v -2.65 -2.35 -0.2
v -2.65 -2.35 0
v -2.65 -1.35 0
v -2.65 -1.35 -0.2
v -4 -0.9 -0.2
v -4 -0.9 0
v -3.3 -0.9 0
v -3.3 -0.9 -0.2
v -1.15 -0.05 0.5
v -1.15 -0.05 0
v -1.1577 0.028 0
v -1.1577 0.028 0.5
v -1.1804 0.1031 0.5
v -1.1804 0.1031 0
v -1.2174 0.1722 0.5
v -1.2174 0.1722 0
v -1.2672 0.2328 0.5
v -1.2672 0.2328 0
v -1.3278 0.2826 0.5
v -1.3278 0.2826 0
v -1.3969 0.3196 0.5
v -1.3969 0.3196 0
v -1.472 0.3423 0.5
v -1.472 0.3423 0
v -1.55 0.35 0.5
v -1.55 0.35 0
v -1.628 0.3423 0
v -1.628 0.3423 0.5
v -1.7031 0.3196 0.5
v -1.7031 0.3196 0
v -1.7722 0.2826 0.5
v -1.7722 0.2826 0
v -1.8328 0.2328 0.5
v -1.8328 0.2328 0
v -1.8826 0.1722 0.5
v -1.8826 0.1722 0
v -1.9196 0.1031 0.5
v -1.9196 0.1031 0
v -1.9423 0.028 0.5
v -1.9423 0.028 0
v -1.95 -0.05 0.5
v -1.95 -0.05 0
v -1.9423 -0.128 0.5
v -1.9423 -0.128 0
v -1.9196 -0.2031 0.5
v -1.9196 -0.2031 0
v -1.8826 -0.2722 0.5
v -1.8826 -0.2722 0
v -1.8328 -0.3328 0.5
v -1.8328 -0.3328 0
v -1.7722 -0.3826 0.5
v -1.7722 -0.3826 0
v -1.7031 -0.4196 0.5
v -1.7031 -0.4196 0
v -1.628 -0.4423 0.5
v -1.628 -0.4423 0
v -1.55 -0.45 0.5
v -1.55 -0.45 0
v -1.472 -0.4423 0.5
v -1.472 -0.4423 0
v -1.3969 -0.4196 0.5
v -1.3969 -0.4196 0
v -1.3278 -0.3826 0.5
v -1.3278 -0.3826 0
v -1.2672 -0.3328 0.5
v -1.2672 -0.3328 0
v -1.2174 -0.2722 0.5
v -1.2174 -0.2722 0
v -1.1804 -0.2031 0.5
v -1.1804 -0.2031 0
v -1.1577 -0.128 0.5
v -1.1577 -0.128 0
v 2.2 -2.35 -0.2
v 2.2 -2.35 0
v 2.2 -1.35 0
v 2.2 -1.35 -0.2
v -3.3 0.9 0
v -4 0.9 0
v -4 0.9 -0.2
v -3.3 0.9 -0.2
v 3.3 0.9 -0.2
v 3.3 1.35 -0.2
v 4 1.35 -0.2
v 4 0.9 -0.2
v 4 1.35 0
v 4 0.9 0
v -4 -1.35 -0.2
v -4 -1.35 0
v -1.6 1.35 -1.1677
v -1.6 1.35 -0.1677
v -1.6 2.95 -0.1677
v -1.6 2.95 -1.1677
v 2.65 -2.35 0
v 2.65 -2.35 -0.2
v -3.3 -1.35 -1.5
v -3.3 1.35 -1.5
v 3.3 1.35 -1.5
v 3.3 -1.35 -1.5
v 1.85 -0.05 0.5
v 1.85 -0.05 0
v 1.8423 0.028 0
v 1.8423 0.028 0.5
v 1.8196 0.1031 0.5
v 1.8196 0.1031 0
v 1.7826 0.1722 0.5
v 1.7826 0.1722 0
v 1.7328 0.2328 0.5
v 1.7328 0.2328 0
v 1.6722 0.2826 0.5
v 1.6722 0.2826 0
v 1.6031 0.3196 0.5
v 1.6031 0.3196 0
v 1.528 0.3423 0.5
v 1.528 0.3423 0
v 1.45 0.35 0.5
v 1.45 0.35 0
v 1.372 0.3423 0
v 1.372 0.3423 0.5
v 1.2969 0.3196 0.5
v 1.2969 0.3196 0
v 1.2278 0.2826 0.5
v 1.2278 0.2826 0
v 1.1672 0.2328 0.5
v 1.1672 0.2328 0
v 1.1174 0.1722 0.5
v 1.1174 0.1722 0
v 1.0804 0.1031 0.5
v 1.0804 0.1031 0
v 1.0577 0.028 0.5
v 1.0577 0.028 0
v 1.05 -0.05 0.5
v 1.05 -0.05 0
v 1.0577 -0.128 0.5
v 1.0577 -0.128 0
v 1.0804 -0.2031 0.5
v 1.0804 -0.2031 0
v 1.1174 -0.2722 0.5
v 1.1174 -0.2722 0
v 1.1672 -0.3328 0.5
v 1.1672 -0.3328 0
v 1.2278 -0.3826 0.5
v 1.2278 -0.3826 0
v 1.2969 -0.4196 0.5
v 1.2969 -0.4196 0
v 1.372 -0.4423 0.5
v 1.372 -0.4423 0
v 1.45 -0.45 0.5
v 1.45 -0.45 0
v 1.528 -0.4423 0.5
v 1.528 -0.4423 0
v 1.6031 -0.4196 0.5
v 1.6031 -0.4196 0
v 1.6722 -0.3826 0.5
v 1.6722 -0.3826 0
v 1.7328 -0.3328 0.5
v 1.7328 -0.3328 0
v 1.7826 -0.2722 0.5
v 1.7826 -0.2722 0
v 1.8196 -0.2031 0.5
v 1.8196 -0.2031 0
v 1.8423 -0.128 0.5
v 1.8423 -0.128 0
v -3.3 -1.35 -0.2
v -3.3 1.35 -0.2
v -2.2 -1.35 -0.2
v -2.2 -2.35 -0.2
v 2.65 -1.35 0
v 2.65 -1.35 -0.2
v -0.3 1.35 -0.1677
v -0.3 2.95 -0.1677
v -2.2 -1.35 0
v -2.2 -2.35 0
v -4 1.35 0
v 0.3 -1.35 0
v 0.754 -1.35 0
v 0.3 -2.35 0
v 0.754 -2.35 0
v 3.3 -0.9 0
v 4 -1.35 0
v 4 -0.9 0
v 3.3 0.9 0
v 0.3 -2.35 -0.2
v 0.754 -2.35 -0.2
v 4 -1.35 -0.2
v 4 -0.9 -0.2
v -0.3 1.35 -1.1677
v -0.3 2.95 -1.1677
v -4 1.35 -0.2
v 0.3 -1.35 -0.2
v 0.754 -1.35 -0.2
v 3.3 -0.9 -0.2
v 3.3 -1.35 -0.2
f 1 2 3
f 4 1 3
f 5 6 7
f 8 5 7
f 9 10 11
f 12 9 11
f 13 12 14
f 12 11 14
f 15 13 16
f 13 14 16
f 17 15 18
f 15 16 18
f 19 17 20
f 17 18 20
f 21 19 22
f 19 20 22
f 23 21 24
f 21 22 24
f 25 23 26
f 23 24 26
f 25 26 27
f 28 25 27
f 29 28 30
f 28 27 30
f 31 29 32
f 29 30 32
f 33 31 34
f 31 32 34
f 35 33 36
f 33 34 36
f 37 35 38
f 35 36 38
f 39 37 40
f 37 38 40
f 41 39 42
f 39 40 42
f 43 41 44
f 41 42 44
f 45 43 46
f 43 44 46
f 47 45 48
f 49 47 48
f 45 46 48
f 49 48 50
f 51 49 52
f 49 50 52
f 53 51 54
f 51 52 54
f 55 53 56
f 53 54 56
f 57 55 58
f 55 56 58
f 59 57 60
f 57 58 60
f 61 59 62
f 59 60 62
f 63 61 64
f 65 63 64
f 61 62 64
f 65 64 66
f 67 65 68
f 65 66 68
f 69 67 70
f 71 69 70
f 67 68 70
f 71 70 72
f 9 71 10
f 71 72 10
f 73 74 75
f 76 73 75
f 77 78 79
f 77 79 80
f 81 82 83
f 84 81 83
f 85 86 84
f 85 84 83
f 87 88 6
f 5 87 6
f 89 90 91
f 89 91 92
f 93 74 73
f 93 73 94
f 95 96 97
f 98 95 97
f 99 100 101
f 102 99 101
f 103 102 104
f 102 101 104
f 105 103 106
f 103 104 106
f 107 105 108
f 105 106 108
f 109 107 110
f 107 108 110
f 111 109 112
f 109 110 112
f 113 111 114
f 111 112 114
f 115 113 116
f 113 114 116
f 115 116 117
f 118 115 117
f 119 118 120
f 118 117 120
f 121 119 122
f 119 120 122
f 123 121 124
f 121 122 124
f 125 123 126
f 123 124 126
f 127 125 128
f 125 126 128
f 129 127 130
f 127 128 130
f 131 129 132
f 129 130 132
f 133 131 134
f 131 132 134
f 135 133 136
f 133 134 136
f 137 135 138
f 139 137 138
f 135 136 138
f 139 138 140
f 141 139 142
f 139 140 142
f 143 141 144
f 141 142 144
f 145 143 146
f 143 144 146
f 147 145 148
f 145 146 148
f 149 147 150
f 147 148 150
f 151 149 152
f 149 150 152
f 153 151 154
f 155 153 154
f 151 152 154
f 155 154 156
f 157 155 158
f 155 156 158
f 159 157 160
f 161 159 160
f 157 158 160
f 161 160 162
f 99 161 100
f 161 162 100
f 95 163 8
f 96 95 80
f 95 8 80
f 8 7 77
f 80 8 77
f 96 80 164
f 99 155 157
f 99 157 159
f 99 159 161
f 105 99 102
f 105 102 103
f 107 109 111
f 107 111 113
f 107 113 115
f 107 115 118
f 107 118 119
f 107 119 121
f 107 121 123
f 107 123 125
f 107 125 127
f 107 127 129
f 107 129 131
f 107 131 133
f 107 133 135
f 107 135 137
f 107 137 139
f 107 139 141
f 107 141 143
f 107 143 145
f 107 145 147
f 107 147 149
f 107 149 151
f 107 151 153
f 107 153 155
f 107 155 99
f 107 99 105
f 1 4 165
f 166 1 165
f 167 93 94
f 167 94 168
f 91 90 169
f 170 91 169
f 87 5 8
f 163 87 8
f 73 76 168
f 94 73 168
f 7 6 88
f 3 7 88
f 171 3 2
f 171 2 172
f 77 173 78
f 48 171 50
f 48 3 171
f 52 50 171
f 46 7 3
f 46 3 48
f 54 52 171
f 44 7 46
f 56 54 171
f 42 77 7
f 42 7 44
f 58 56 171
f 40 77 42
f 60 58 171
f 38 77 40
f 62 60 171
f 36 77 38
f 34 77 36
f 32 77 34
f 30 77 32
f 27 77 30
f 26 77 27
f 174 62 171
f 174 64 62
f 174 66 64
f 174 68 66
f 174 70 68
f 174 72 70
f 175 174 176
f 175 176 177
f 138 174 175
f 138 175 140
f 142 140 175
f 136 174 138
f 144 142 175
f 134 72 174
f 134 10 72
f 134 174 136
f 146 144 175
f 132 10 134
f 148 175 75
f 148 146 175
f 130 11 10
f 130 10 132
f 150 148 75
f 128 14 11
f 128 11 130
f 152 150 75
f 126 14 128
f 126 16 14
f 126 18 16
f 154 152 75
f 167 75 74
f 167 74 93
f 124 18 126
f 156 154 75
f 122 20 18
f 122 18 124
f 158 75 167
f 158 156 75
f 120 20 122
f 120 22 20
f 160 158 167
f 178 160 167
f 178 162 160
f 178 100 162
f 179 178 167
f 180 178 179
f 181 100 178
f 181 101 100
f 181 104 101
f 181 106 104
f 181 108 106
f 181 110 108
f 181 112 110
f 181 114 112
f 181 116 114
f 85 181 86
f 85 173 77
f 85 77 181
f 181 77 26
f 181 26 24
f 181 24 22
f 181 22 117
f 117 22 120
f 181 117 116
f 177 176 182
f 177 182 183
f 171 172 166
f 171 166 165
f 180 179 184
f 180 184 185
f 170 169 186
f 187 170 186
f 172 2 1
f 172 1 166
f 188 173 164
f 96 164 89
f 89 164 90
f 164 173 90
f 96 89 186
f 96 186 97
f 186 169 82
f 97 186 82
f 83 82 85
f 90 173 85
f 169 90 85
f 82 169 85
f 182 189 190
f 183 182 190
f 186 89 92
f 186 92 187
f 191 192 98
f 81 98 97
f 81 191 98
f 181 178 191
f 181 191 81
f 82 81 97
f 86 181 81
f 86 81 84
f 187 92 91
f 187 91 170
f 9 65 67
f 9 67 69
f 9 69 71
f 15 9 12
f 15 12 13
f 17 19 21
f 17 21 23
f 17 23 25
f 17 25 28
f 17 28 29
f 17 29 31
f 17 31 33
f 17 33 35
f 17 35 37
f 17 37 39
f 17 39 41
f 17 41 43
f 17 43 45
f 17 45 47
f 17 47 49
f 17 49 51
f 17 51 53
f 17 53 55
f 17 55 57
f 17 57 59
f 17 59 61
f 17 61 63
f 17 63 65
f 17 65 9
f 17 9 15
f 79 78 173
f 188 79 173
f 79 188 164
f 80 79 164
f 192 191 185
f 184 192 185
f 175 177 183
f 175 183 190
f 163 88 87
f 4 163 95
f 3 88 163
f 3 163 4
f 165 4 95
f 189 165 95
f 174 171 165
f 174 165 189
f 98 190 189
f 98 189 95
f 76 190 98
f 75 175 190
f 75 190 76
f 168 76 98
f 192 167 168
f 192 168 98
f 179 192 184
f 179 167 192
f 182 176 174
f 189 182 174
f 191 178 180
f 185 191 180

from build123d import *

# Parameters (mm, degrees)
SKETCH_1_W         = 6.6
SKETCH_1_H         = 2.7
EXTRUDE_1_DEPTH    = 1.5
SKETCH_2_W         = 0.7
SKETCH_2_H         = 0.45
EXTRUDE_664_DEPTH  = 0.2
SKETCH_3_W         = 0.45
SKETCH_3_H         = 1
SKETCH_3_W_2       = 0.45404522
EXTRUDE_1058_DEPTH = 0.2
SKETCH_4_W         = 1.3
SKETCH_4_H         = 1
EXTRUDE_4_DEPTH    = 1.6
SKETCH_5_R         = 0.4
EXTRUDE_5_DEPTH    = 0.5


with BuildPart() as part:
    # 草图1 → 凸台-拉伸1 (new body)
    with BuildSketch(Plane.XY):
        Rectangle(SKETCH_1_W, SKETCH_1_H)
    extrude(amount=-EXTRUDE_1_DEPTH)

    # 草图2 → Extrude 664 (add)
    with BuildSketch(Plane.XY):
        with Locations((-3.65, 1.125)):
            Rectangle(SKETCH_2_W, SKETCH_2_H)
        with Locations((3.65, 1.125)):
            Rectangle(SKETCH_2_W, SKETCH_2_H)
        with Locations((3.65, -1.125)):
            Rectangle(SKETCH_2_W, SKETCH_2_H)
        with Locations((-3.65, -1.125)):
            Rectangle(SKETCH_2_W, SKETCH_2_H)
    extrude(amount=-EXTRUDE_664_DEPTH)

    # 草图3 → Extrude 1058 (add)
    with BuildSketch(Plane.XY):
        with Locations((2.425, -1.85)):
            Rectangle(SKETCH_3_W, SKETCH_3_H)
        with Locations((-2.425, -1.85)):
            Rectangle(SKETCH_3_W, SKETCH_3_H)
        with Locations((0.52702261, -1.85)):
            Rectangle(SKETCH_3_W_2, SKETCH_3_H)
    extrude(amount=-EXTRUDE_1058_DEPTH)

    # 草图4 → 凸台-拉伸4 (add)
    with BuildSketch(Plane(origin=(0, 1.35, 0), x_dir=(1, 0, 0), z_dir=(0, 1, 0))):
        with Locations((-0.95, 0.667693313)):
            Rectangle(SKETCH_4_W, SKETCH_4_H)
    extrude(amount=EXTRUDE_4_DEPTH)

    # 草图5 → 凸台-拉伸5 (add)
    with BuildSketch(Plane.XY):
        with Locations((1.45, -0.05)):
            Circle(SKETCH_5_R)
        with Locations((-1.55, -0.05)):
            Circle(SKETCH_5_R)
    extrude(amount=EXTRUDE_5_DEPTH)


solid = part.part
